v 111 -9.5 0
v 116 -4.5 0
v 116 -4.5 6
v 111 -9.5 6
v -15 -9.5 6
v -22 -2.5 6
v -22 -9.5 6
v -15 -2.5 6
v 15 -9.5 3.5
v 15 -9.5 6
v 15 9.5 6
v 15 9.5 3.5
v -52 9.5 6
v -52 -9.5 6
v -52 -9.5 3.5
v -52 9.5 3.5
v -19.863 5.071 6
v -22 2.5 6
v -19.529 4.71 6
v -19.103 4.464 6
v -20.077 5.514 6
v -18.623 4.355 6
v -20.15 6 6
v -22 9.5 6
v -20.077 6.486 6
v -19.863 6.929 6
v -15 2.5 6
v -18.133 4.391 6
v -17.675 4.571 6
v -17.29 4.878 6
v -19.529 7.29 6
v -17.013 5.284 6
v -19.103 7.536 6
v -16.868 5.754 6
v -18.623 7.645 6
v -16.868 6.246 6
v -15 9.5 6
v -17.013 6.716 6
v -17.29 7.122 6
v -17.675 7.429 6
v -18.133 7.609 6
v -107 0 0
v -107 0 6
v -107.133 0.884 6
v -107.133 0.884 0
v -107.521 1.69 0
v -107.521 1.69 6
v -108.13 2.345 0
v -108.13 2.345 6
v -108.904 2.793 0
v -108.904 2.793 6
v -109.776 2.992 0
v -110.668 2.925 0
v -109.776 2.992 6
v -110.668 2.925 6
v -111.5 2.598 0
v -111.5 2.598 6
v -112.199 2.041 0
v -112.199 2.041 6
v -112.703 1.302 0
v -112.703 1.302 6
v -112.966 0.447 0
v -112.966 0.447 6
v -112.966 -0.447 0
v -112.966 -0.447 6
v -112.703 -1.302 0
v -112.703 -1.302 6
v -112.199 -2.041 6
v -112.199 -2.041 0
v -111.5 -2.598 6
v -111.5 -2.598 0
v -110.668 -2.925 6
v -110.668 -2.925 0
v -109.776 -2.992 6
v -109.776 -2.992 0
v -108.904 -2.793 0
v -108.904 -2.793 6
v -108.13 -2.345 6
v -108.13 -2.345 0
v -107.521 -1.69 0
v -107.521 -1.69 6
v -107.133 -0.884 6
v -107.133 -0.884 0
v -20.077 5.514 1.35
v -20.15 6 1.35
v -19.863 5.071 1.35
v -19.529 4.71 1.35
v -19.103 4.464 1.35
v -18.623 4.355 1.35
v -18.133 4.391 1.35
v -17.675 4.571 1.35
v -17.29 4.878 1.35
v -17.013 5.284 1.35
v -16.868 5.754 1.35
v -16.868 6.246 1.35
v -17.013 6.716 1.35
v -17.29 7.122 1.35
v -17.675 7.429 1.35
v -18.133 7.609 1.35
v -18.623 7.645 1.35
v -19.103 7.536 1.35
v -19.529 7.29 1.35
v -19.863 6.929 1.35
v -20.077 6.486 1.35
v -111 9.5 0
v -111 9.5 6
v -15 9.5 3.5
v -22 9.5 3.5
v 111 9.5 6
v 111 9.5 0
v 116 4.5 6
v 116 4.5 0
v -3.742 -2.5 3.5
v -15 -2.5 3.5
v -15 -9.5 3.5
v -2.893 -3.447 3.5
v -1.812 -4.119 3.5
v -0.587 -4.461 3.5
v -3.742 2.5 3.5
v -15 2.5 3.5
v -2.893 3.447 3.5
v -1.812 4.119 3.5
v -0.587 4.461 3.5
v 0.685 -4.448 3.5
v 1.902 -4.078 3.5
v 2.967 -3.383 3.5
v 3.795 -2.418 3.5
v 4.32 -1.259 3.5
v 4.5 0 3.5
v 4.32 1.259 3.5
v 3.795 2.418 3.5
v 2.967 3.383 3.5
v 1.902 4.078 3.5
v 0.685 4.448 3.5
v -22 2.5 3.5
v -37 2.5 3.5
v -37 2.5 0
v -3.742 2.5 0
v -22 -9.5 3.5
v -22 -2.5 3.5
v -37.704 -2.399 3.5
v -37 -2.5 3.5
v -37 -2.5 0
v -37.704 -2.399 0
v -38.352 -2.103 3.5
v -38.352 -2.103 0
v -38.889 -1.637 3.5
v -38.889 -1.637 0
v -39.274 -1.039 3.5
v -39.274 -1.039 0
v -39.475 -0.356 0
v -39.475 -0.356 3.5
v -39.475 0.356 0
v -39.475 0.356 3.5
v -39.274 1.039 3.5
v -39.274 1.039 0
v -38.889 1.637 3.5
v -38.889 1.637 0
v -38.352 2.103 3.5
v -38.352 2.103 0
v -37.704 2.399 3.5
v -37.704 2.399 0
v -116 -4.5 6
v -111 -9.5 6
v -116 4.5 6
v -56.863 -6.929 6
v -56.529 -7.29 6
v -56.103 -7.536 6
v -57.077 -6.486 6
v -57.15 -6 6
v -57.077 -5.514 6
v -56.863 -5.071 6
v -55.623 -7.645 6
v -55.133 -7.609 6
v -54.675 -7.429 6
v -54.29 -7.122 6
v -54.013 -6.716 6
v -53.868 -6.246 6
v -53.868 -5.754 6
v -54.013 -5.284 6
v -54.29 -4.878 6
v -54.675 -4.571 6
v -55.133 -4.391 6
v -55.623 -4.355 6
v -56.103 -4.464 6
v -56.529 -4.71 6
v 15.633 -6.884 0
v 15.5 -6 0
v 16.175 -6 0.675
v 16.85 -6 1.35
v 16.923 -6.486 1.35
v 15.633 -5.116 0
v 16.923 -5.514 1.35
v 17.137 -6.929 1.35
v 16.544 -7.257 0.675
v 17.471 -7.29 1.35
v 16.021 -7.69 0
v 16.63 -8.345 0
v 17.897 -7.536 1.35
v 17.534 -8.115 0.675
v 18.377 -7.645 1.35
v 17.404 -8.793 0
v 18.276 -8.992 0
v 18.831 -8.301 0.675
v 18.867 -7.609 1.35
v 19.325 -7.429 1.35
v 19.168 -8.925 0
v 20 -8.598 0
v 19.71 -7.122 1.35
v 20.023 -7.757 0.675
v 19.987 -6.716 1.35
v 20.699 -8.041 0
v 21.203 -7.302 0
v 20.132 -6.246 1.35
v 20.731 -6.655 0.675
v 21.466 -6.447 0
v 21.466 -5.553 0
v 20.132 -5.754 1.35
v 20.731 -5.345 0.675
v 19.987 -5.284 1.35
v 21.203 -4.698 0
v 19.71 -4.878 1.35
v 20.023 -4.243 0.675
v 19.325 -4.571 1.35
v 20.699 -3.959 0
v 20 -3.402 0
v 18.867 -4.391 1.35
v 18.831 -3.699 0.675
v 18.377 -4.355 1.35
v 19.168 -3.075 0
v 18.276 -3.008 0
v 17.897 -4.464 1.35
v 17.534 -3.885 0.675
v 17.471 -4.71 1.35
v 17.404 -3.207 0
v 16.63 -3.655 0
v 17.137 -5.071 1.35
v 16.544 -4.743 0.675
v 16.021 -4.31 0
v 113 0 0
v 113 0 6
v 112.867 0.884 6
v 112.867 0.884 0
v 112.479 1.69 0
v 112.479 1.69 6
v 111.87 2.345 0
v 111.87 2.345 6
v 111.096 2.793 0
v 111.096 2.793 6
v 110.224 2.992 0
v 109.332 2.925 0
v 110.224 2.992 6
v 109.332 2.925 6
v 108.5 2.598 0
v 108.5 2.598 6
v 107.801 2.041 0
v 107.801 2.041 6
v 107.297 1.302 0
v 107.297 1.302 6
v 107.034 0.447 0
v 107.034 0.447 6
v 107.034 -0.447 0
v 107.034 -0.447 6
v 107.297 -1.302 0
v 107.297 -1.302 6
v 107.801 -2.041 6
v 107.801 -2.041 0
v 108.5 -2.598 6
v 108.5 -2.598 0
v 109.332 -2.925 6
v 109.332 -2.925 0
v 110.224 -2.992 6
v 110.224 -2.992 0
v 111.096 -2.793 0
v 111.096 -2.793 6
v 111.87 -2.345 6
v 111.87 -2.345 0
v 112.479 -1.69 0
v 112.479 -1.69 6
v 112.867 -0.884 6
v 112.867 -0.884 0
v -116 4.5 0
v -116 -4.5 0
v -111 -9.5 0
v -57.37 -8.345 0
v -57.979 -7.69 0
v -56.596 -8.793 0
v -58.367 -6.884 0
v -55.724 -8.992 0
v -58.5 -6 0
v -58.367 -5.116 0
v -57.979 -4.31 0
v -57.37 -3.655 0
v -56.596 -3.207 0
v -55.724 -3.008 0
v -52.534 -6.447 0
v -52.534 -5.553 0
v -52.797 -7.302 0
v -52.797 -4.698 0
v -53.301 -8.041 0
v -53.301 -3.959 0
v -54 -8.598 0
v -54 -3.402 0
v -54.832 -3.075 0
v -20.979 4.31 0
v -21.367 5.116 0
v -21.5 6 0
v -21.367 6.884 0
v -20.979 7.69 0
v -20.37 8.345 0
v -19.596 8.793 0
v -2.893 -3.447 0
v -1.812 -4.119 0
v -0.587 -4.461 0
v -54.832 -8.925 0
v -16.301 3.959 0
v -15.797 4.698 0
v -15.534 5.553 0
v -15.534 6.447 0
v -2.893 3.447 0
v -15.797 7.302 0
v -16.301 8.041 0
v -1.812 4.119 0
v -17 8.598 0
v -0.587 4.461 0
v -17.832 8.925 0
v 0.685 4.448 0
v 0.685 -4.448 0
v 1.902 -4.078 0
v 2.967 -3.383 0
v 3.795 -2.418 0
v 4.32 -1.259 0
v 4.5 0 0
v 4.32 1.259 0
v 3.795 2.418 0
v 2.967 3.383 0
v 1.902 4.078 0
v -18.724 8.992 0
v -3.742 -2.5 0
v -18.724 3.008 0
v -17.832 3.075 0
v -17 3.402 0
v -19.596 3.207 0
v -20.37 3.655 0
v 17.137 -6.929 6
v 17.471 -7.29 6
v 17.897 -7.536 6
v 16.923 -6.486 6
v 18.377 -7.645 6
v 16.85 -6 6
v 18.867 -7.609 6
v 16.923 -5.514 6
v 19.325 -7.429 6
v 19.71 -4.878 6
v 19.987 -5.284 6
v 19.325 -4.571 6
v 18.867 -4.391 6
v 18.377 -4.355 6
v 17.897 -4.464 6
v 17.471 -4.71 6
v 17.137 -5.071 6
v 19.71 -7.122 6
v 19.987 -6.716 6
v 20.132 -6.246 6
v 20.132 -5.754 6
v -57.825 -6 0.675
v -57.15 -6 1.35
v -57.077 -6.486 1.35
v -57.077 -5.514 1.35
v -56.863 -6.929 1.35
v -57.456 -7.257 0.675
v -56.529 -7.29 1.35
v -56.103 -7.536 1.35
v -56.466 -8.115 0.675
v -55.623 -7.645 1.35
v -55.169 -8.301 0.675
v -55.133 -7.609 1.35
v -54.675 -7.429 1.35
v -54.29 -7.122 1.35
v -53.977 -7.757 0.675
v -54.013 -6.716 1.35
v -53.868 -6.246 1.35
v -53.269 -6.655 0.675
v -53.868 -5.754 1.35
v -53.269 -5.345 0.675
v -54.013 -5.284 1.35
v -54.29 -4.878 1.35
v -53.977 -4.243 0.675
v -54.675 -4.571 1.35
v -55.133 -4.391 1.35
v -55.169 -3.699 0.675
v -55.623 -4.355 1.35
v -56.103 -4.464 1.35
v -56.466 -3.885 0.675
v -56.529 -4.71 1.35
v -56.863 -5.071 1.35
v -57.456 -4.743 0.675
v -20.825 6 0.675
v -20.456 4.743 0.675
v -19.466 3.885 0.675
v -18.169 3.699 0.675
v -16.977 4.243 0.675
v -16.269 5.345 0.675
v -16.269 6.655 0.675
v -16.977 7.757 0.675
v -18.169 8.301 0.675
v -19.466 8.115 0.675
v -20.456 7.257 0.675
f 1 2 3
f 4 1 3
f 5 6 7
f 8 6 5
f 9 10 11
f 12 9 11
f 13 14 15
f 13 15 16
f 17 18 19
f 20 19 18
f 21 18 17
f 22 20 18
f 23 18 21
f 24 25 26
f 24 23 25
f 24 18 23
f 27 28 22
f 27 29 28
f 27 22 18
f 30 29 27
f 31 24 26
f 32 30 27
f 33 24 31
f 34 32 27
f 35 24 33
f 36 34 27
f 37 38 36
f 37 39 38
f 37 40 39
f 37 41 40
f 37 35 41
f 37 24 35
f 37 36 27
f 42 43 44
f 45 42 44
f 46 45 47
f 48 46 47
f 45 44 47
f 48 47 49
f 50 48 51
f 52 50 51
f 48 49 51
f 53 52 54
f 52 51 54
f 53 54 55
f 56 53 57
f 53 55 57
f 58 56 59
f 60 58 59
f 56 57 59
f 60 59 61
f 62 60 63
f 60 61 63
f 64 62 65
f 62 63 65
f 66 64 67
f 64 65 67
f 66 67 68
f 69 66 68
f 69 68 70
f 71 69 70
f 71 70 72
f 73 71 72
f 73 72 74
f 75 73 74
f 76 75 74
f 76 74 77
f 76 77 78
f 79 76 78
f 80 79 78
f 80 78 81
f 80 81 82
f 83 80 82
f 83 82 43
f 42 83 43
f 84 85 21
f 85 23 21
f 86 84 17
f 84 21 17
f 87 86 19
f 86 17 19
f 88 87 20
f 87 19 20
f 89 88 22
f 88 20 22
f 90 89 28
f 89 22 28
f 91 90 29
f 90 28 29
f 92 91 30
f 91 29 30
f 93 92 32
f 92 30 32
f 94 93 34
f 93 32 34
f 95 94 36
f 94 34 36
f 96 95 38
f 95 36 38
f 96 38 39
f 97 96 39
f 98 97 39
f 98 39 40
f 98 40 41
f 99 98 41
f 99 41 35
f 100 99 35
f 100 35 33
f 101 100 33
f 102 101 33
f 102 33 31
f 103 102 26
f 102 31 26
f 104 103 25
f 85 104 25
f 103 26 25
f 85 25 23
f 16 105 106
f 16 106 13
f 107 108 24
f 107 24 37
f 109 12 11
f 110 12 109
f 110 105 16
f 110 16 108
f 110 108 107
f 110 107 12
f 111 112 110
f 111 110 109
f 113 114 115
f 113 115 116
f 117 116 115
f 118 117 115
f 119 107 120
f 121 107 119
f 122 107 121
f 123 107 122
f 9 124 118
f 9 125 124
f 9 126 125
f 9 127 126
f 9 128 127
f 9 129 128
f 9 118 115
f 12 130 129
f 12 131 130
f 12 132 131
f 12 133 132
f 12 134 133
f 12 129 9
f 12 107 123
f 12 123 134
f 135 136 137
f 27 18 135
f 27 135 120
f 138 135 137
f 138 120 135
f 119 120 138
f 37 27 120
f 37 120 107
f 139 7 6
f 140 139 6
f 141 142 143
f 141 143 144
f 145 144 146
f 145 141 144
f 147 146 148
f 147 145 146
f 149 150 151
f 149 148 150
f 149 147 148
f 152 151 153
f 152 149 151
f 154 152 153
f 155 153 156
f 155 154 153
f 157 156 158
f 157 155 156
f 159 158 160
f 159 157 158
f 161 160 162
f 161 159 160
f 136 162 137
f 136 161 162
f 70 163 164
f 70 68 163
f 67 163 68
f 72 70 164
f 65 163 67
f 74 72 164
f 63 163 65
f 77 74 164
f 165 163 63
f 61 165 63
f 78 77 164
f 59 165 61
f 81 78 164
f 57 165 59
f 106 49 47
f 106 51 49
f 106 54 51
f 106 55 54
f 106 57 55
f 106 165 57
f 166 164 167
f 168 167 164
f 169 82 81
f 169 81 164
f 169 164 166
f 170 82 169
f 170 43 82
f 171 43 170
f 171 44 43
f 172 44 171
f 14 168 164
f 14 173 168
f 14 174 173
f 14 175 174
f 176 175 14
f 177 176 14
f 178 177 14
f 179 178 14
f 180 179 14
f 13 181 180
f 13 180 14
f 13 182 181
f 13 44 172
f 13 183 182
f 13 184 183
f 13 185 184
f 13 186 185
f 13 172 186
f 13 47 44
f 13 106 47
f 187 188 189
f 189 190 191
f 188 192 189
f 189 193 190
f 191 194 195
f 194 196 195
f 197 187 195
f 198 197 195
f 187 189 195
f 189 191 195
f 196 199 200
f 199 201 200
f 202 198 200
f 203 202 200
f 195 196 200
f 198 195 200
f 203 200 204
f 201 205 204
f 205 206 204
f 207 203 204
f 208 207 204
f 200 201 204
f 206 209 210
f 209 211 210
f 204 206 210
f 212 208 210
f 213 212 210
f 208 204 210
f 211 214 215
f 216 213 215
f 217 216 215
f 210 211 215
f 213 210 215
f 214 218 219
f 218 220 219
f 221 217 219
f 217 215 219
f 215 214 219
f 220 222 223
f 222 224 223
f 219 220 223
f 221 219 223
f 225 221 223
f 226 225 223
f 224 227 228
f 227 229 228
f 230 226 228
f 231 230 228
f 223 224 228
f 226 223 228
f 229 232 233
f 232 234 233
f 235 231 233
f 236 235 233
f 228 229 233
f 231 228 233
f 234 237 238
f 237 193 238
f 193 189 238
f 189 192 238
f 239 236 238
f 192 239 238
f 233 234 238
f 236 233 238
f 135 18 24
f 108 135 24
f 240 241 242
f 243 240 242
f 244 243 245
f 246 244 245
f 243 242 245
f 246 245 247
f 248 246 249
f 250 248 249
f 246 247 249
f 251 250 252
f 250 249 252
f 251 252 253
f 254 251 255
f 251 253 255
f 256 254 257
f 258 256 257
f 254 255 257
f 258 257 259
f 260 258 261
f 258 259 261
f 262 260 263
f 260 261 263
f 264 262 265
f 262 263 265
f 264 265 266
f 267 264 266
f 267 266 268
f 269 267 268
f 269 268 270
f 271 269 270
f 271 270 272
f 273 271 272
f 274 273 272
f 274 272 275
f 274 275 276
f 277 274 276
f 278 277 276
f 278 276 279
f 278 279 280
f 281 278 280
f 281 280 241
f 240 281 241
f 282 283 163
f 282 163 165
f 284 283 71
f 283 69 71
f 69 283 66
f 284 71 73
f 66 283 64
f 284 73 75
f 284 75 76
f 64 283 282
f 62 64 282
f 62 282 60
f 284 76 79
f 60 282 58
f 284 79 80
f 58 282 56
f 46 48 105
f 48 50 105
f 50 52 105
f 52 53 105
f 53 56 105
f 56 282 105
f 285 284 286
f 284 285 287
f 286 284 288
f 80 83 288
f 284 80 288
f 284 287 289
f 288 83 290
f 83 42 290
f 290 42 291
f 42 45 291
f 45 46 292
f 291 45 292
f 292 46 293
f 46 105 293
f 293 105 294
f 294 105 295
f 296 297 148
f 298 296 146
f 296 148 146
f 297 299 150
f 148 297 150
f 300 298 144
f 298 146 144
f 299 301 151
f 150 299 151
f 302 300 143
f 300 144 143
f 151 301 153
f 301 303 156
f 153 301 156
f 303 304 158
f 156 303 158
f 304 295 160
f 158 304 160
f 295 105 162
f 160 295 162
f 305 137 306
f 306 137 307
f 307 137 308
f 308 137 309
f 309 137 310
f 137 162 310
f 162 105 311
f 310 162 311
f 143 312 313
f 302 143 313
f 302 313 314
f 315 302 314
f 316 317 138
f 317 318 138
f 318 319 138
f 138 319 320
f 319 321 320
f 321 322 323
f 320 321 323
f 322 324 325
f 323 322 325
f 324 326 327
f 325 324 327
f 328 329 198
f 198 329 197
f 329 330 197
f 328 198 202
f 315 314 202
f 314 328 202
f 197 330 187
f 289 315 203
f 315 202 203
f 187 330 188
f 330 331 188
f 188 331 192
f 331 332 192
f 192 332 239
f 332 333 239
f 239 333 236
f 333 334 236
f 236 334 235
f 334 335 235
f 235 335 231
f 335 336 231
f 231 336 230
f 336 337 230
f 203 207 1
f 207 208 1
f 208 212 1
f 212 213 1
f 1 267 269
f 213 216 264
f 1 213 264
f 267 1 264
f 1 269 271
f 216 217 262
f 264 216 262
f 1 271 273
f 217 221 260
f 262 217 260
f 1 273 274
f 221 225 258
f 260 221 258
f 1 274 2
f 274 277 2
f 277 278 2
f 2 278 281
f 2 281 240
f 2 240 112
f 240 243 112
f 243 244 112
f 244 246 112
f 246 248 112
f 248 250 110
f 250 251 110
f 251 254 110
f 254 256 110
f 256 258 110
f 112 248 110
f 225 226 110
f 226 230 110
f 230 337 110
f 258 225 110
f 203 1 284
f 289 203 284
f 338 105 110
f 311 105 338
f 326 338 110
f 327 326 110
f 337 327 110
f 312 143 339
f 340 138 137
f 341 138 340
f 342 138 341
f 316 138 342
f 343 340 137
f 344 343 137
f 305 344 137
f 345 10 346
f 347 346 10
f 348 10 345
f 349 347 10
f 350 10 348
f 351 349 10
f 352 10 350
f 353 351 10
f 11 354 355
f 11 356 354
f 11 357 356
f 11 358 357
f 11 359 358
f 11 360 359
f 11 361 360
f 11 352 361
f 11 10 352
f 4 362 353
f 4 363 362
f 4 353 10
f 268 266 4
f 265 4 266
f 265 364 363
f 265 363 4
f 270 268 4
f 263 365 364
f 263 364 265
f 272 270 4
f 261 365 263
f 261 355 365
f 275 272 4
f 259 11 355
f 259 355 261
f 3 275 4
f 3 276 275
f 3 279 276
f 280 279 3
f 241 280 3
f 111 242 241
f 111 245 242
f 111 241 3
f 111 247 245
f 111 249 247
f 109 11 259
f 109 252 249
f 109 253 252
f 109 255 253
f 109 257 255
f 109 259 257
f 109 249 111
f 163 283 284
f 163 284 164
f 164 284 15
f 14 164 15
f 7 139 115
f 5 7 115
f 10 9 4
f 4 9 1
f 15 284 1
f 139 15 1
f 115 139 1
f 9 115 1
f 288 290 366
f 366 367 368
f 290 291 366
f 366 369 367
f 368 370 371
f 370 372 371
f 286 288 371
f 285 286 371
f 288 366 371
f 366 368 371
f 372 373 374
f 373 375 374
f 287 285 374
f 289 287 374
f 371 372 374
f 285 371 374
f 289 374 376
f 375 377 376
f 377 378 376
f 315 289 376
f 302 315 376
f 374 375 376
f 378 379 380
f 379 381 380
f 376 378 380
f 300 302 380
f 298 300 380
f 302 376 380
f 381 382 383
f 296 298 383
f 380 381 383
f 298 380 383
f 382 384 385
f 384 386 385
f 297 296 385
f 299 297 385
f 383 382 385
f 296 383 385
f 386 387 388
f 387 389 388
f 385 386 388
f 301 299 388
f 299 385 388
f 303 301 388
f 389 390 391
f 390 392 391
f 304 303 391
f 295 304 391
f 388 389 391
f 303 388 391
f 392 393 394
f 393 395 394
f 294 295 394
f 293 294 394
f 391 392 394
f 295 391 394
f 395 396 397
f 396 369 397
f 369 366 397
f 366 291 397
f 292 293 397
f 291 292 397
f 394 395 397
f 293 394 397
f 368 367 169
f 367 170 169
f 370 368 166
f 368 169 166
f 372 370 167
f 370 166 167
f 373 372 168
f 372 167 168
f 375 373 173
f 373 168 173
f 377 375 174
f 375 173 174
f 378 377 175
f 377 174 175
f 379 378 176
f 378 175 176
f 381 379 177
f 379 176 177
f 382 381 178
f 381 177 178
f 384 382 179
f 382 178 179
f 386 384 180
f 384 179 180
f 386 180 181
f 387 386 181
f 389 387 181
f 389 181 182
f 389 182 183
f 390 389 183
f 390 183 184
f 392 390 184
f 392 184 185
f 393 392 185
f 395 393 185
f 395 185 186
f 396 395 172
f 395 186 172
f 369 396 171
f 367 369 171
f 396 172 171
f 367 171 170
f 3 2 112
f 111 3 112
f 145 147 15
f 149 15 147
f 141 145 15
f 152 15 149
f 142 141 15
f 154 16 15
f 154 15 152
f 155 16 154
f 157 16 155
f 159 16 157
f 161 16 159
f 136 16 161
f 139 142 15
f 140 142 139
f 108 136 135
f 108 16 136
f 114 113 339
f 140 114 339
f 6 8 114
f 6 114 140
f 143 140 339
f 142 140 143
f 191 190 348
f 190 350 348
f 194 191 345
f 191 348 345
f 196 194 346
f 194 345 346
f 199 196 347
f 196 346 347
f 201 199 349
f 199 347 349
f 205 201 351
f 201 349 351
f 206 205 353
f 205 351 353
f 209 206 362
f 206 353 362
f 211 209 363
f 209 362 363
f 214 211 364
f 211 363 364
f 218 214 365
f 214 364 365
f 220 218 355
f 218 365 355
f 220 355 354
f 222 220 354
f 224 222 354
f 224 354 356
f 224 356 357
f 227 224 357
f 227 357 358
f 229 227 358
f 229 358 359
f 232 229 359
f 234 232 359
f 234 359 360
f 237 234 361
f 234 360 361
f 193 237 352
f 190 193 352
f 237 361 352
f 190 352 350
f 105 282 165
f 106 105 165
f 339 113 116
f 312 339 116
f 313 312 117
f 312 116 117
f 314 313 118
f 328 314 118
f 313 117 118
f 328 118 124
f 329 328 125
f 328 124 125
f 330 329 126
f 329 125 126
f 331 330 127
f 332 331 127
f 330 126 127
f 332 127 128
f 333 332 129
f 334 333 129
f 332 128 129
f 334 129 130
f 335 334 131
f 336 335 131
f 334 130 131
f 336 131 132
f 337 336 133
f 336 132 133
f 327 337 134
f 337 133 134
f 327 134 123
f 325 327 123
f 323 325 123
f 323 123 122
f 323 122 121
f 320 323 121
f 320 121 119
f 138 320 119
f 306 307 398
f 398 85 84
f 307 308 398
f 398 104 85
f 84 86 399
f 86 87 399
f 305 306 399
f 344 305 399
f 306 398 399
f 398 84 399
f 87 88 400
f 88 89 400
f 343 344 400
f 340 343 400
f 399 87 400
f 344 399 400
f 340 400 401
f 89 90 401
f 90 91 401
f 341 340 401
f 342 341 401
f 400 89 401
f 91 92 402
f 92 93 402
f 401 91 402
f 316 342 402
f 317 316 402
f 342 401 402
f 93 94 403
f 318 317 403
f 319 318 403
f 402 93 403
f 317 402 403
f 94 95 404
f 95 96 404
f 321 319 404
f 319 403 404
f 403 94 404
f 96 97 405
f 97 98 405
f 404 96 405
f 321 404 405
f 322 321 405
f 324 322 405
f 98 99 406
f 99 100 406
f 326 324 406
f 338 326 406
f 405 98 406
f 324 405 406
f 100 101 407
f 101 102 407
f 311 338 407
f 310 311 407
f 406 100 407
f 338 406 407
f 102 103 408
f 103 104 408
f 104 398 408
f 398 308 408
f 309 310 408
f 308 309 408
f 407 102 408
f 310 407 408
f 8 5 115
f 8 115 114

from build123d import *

# Parameters (mm, degrees)
SKETCH_1_W                   = 232
SKETCH_1_H                   = 19
EXTRUDE_1_DEPTH              = 6
SKETCH_3_W                   = 30
SKETCH_3_H                   = 19
CUT_EXTRUDE_2_DEPTH          = 2.5
SKETCH_5_R                   = 3
CUT_EXTRUDE_4_DEPTH          = 117.542910552
SKETCH_4_R                   = 4.5
CUT_EXTRUDE_3_DEPTH          = 117.542910552
CHAMFER_1_SIZE               = 5
HOLE_WIZARD_M6_1_D           = 3.3
HOLE_WIZARD_M6_1_CSINK_D     = 6
HOLE_WIZARD_M6_1_CSINK_ANGLE = 90


with BuildPart() as part:
    # 草图1 → 凸台-拉伸1 (new body)
    with BuildSketch(Plane.XY):
        Rectangle(SKETCH_1_W, SKETCH_1_H)
    extrude(amount=EXTRUDE_1_DEPTH)

    # 草图3 → 切除-拉伸2 (cut)
    with BuildSketch(Plane.XY.offset(6)):
        with Locations((-37, 0)):
            Rectangle(SKETCH_3_W, SKETCH_3_H)
        Rectangle(SKETCH_3_W, SKETCH_3_H)
    extrude(amount=-CUT_EXTRUDE_2_DEPTH, mode=Mode.SUBTRACT)

    # 草图5 → 切除-拉伸4 (cut, through all)
    with BuildSketch(Plane.XY.offset(6)):
        with Locations((110, 0)):
            Circle(SKETCH_5_R)
        with Locations((-110, 0)):
            Circle(SKETCH_5_R)
    extrude(amount=-CUT_EXTRUDE_4_DEPTH, mode=Mode.SUBTRACT)

    # 草图4 → 切除-拉伸3 (cut, through all)
    with BuildSketch(Plane.XY.offset(6)):
        Circle(SKETCH_4_R)
        with BuildLine():
            Line((-37, 2.5), (0, 2.5))
            ThreePointArc((0, 2.5), (2.5, 0), (0, -2.5))
            Line((0, -2.5), (-37, -2.5))
            ThreePointArc((-37, -2.5), (-39.5, 0), (-37, 2.5))
        make_face()
    extrude(amount=-CUT_EXTRUDE_3_DEPTH, mode=Mode.SUBTRACT)

    # 倒角1
    chamfer_1_edges = [part.edges().sort_by_distance(p)[0] for p in [
        (-116, 9.5, 3),
        (116, 9.5, 3),
        (116, -9.5, 3),
        (-116, -9.5, 3),
    ]]
    chamfer(chamfer_1_edges, length=CHAMFER_1_SIZE)

    # M6 内六角花形半沉头螺钉的锥形沉头孔1 (through all)
    with Locations(Plane(origin=(0, 0, 0), x_dir=(1, 0, 0), z_dir=(0, 0, -1))):
        with Locations((-18.5, -6), (-55.5, 6), (18.5, 6)):
            CounterSinkHole(HOLE_WIZARD_M6_1_D / 2, HOLE_WIZARD_M6_1_CSINK_D / 2, counter_sink_angle=HOLE_WIZARD_M6_1_CSINK_ANGLE)


solid = part.part
